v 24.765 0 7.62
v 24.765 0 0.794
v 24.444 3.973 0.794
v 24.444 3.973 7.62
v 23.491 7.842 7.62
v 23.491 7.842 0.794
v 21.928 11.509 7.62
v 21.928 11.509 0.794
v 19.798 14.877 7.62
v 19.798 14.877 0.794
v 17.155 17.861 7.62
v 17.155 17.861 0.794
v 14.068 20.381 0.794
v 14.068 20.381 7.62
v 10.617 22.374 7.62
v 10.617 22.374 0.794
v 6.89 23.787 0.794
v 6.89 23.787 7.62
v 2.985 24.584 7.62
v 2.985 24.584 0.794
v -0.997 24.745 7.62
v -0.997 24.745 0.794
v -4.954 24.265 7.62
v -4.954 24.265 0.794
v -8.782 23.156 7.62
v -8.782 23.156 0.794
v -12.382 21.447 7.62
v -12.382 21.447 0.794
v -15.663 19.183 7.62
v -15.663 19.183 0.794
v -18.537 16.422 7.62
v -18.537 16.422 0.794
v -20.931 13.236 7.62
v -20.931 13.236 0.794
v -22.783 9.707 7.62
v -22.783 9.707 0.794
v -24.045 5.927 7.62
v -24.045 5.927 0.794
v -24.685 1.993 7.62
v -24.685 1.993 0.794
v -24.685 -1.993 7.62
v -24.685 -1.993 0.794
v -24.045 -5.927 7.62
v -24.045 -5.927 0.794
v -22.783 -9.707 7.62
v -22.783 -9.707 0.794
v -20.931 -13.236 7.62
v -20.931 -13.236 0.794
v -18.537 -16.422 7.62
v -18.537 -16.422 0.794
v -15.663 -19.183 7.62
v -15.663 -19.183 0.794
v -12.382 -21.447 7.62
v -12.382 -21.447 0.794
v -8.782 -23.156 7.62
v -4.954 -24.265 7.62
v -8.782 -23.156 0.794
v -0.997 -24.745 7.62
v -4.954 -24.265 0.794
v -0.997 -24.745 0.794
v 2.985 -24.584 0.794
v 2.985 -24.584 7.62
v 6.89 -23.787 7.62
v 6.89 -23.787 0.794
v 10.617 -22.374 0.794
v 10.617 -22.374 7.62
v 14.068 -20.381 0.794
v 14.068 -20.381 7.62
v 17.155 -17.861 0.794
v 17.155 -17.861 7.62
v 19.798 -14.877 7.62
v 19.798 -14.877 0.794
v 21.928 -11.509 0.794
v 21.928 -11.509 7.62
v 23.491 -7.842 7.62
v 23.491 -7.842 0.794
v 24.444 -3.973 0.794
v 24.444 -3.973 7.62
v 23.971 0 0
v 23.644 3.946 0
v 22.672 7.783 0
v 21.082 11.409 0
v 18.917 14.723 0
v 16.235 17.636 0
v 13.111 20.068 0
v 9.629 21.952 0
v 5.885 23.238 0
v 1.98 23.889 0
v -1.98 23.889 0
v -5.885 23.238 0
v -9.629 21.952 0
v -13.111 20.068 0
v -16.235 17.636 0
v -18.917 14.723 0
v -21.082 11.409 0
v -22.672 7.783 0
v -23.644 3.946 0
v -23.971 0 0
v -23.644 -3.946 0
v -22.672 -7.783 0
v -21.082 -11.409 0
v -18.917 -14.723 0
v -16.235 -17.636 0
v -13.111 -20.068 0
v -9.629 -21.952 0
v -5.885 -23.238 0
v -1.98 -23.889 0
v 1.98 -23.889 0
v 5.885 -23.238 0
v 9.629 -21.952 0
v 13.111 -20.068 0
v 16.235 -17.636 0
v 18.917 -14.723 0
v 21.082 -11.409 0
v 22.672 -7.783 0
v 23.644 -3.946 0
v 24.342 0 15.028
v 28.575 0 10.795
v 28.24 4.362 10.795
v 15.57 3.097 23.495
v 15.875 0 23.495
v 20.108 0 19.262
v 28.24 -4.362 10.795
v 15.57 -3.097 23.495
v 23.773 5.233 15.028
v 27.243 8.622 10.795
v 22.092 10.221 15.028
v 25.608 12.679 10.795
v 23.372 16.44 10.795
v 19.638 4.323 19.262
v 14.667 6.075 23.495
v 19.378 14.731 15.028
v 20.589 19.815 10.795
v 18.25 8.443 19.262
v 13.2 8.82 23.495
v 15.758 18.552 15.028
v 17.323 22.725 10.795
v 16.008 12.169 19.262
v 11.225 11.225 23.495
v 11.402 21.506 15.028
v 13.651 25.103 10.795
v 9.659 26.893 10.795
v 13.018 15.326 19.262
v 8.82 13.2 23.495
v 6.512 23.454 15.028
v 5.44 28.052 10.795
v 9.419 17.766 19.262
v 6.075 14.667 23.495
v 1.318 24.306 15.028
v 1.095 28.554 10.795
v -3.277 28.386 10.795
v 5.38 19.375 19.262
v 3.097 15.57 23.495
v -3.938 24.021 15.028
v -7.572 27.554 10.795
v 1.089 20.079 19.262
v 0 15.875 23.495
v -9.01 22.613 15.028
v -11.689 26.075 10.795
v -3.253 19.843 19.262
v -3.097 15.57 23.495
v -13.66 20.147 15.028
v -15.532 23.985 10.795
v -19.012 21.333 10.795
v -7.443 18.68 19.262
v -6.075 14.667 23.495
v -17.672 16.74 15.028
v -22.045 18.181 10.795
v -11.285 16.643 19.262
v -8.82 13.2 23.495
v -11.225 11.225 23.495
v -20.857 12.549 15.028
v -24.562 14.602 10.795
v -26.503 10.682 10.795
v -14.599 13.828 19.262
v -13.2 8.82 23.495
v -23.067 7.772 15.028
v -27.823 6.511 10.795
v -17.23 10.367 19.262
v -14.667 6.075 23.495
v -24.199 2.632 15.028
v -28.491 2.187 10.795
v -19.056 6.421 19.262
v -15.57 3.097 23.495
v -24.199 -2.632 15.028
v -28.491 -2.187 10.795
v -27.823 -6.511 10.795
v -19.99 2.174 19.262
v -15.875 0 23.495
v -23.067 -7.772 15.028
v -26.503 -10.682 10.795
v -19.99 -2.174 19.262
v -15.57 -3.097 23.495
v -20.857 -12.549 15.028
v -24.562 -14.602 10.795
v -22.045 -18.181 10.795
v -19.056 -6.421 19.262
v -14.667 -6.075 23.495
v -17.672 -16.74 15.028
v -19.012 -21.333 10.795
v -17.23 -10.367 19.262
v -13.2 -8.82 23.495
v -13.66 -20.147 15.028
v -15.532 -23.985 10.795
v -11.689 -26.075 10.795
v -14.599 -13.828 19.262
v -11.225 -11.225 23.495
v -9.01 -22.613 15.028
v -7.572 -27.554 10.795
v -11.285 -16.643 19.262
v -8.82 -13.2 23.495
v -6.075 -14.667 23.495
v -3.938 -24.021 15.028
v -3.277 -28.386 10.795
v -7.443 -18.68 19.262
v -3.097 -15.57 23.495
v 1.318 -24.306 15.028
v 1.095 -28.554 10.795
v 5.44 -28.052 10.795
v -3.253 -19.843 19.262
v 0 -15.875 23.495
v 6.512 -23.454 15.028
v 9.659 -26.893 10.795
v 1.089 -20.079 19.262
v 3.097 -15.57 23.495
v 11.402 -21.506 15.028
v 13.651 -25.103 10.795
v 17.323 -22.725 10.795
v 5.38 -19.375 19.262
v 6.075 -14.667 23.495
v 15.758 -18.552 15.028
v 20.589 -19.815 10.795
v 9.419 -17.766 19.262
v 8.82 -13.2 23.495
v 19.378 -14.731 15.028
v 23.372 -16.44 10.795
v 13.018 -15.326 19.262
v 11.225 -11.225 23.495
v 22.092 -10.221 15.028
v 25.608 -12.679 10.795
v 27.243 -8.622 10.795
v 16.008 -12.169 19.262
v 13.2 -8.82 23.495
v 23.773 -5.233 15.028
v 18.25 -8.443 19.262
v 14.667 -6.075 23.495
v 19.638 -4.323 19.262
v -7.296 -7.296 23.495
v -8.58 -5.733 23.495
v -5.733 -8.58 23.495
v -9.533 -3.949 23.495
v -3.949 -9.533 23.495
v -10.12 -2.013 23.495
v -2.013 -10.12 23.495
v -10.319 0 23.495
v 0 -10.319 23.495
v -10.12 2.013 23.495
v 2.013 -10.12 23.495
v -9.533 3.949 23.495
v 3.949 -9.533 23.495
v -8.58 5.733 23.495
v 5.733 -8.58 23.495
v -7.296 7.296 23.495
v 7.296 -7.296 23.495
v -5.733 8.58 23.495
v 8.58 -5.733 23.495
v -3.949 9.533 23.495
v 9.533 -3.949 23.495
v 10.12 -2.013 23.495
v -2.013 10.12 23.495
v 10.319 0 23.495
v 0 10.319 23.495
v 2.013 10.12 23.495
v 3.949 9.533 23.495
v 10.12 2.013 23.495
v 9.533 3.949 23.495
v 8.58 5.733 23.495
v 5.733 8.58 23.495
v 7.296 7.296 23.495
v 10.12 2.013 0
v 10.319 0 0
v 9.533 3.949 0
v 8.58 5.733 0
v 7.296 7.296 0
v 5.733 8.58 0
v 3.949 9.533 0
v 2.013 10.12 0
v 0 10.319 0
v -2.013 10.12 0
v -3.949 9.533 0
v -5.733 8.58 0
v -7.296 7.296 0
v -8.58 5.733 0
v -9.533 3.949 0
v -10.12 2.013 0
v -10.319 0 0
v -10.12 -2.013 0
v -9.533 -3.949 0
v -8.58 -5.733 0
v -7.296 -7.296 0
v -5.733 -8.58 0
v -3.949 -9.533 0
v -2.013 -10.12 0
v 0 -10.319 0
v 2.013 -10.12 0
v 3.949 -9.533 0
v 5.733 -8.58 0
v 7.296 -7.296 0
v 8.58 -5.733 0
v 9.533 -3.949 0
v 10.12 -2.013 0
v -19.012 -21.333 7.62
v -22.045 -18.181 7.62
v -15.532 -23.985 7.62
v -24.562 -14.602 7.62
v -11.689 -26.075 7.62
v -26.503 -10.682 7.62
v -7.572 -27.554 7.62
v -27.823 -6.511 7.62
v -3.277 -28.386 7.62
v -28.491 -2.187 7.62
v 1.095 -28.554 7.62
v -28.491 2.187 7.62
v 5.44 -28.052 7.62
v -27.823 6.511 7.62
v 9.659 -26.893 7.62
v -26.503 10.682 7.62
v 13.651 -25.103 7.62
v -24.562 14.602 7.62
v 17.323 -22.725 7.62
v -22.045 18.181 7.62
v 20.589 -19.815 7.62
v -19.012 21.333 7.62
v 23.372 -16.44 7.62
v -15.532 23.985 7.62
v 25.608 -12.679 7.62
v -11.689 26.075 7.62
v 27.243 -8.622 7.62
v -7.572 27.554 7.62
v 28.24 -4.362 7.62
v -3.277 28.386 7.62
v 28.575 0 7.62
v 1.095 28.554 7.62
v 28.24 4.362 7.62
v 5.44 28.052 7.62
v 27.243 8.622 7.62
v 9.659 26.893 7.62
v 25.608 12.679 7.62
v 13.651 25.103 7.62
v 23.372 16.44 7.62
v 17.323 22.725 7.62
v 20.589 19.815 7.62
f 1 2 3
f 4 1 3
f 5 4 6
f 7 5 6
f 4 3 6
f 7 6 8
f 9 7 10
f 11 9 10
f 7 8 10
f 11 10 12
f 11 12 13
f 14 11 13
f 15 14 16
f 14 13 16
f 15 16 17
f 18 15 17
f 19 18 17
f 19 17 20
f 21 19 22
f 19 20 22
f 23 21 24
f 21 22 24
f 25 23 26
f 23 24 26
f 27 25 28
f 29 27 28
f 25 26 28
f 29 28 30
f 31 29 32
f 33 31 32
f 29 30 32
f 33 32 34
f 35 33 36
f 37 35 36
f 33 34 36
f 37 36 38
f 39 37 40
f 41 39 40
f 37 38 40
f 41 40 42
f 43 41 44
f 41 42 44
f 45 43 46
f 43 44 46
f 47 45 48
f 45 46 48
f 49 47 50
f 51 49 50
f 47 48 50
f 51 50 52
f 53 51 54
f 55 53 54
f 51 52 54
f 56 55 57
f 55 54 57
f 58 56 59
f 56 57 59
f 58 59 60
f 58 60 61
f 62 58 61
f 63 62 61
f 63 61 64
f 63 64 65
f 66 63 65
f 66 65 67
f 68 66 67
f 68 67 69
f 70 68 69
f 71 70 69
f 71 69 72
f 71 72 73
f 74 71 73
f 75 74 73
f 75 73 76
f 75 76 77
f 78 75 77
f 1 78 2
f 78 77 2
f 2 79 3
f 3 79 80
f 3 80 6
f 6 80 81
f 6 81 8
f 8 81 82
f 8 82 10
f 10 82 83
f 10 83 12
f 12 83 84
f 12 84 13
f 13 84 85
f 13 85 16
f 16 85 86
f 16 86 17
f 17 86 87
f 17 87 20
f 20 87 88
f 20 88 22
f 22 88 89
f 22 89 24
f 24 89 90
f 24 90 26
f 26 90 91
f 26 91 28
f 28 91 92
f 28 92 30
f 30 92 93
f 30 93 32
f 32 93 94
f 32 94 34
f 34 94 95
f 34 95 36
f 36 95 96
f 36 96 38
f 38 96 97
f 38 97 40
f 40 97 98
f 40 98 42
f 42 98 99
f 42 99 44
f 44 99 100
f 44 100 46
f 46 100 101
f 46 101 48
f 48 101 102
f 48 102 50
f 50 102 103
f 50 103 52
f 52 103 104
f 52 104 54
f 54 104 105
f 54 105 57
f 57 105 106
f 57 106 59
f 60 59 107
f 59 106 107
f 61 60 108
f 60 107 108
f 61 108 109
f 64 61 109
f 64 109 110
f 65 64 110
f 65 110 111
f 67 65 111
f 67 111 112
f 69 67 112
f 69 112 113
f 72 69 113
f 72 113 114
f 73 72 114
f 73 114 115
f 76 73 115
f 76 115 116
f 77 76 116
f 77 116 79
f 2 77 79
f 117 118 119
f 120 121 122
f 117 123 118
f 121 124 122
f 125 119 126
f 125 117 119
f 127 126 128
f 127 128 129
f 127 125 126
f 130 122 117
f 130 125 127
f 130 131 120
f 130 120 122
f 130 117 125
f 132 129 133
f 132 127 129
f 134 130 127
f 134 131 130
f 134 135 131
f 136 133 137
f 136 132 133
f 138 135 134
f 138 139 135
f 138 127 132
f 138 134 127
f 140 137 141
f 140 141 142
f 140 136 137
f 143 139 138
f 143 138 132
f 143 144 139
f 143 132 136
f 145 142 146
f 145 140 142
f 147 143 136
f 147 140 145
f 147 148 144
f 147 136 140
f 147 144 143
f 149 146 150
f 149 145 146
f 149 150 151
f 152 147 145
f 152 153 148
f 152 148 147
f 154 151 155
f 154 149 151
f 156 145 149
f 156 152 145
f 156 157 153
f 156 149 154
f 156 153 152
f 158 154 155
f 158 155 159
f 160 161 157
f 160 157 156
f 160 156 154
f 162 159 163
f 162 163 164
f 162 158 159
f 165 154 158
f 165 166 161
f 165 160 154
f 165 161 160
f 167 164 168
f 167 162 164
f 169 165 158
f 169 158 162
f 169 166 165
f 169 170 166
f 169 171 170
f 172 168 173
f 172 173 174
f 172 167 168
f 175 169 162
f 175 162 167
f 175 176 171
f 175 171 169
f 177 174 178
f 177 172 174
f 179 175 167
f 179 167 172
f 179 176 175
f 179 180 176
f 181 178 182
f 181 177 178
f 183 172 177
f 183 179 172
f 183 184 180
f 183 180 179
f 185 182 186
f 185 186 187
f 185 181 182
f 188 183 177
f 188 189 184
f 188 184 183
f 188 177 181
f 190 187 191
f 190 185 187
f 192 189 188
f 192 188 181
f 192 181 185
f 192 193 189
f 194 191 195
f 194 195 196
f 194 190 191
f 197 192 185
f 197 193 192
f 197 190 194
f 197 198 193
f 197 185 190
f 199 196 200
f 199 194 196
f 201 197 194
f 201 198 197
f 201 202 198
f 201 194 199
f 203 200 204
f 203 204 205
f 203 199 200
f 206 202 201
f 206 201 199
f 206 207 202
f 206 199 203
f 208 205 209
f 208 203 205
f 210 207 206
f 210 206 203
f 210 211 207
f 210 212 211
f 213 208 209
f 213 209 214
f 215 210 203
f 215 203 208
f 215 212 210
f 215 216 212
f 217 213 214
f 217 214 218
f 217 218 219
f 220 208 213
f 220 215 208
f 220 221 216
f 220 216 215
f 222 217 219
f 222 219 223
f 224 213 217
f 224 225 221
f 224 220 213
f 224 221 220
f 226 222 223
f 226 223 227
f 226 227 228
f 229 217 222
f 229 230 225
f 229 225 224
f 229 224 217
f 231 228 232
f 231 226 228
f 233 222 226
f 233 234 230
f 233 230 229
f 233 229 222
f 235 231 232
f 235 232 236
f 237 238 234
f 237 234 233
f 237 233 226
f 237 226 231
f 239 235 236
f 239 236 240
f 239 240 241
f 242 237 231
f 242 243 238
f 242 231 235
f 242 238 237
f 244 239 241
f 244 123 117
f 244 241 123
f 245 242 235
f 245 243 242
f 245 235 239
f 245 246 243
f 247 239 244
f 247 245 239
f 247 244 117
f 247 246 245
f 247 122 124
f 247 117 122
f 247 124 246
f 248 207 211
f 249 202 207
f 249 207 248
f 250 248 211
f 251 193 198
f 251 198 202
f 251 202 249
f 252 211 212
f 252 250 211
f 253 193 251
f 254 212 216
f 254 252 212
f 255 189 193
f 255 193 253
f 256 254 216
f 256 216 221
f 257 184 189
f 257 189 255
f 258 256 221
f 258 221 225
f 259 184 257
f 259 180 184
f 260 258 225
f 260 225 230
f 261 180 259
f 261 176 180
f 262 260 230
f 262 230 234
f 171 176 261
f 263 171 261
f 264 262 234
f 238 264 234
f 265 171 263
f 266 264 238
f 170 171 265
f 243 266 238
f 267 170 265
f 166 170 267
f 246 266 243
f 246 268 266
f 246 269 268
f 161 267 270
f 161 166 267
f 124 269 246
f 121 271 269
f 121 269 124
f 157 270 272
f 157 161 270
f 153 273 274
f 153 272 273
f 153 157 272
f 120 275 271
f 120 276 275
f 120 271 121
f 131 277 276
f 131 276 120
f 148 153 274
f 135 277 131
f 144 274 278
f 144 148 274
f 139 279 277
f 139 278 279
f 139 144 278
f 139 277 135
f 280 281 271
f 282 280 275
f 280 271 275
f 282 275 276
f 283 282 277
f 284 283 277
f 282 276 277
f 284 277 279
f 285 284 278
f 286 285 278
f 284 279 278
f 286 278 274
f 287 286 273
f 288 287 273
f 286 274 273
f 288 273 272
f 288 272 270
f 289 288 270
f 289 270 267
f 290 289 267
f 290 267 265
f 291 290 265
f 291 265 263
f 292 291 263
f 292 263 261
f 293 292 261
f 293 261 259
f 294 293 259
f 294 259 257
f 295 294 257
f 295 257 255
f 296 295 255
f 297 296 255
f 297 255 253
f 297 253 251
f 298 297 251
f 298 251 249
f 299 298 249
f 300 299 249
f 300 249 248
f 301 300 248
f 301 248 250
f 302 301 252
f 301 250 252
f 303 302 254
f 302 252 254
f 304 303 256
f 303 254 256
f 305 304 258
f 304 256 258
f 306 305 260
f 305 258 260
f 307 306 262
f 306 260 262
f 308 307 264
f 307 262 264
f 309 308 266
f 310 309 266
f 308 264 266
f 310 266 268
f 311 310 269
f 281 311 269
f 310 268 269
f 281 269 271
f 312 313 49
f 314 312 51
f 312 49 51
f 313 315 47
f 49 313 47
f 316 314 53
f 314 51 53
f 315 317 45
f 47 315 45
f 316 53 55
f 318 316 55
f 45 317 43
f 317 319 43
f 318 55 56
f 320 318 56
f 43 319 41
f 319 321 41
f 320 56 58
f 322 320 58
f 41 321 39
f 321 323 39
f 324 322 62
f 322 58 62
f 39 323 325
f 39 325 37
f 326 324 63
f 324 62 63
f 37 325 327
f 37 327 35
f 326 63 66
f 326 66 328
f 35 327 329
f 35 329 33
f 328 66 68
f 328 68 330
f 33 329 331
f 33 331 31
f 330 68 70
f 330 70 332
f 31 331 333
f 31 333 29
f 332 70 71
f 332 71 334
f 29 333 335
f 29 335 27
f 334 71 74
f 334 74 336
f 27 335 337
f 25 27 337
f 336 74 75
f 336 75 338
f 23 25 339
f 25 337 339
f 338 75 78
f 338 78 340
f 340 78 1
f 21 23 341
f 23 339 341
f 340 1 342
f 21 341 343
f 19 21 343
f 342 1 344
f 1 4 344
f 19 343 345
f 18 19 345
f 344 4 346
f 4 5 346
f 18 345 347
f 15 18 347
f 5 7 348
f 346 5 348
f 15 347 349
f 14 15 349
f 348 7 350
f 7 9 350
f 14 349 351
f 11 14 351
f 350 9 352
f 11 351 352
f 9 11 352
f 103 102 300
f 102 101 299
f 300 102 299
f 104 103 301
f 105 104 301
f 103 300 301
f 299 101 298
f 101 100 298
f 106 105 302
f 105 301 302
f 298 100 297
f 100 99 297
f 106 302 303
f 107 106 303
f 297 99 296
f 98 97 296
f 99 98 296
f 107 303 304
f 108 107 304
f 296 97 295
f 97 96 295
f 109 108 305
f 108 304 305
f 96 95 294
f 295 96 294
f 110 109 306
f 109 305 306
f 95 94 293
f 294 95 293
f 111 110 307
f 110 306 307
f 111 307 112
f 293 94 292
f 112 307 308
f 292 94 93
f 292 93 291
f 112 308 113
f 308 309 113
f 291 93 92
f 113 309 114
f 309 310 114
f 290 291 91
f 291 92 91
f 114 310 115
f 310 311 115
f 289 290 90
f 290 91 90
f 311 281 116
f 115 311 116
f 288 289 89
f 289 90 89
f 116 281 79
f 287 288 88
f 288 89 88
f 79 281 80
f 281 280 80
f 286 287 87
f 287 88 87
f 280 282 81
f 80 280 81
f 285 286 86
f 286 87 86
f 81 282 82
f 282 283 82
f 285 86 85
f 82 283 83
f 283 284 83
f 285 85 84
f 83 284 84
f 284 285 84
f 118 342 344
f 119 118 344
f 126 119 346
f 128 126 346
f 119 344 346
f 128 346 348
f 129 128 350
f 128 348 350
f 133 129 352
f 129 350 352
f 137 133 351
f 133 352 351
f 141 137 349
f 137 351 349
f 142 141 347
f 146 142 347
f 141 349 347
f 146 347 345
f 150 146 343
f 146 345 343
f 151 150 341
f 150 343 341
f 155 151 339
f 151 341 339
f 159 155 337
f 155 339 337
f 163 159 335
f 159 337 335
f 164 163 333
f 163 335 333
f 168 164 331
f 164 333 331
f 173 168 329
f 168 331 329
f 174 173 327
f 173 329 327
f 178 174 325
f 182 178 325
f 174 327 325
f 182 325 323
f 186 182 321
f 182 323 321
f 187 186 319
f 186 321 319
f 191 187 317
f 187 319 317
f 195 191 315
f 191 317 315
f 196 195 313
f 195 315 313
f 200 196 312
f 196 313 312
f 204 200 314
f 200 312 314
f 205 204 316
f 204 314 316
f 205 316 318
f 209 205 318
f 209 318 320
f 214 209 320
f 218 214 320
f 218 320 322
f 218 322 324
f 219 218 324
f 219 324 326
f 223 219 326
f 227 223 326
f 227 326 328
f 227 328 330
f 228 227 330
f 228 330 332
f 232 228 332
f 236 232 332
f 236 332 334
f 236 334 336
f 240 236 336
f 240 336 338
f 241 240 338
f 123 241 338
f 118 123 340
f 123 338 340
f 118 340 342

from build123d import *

# Parameters (mm, degrees)
F0_R     = 24.765
F1_DEPTH = 7.62
F2_R     = 28.575
F3_DEPTH = 15.875
F4_SIZE2 = 12.7
F4_SIZE  = 12.7
F5_R     = 10.31875
F6_DEPTH = 23.496
F7_SIZE  = 0.79375


with BuildPart() as f1:
    # F0 (on Top) → F1 (new body)
    with BuildSketch(Plane.XY):
        Circle(F0_R)
    extrude(amount=F1_DEPTH)

    # F2 (on face) → F3 (join)
    with BuildSketch(Plane.XY.offset(7.62)):
        Circle(F2_R)
    extrude(amount=F3_DEPTH)

    # F4
    f4_edges = [f1.edges().sort_by_distance(p)[0] for p in [
        (-28.575, 0, 23.495),
    ]]
    chamfer(f4_edges, length=F4_SIZE, length2=F4_SIZE2)

    # F5 (on face) → F6 (cut, through all)
    with BuildSketch(Plane.XY.offset(23.495)):
        Circle(F5_R)
    extrude(amount=-F6_DEPTH, mode=Mode.SUBTRACT)

    # F7
    f7_edges = [f1.edges().sort_by_distance(p)[0] for p in [
        (-24.765, 0, 0),
    ]]
    chamfer(f7_edges, length=F7_SIZE)


solid = f1.part
